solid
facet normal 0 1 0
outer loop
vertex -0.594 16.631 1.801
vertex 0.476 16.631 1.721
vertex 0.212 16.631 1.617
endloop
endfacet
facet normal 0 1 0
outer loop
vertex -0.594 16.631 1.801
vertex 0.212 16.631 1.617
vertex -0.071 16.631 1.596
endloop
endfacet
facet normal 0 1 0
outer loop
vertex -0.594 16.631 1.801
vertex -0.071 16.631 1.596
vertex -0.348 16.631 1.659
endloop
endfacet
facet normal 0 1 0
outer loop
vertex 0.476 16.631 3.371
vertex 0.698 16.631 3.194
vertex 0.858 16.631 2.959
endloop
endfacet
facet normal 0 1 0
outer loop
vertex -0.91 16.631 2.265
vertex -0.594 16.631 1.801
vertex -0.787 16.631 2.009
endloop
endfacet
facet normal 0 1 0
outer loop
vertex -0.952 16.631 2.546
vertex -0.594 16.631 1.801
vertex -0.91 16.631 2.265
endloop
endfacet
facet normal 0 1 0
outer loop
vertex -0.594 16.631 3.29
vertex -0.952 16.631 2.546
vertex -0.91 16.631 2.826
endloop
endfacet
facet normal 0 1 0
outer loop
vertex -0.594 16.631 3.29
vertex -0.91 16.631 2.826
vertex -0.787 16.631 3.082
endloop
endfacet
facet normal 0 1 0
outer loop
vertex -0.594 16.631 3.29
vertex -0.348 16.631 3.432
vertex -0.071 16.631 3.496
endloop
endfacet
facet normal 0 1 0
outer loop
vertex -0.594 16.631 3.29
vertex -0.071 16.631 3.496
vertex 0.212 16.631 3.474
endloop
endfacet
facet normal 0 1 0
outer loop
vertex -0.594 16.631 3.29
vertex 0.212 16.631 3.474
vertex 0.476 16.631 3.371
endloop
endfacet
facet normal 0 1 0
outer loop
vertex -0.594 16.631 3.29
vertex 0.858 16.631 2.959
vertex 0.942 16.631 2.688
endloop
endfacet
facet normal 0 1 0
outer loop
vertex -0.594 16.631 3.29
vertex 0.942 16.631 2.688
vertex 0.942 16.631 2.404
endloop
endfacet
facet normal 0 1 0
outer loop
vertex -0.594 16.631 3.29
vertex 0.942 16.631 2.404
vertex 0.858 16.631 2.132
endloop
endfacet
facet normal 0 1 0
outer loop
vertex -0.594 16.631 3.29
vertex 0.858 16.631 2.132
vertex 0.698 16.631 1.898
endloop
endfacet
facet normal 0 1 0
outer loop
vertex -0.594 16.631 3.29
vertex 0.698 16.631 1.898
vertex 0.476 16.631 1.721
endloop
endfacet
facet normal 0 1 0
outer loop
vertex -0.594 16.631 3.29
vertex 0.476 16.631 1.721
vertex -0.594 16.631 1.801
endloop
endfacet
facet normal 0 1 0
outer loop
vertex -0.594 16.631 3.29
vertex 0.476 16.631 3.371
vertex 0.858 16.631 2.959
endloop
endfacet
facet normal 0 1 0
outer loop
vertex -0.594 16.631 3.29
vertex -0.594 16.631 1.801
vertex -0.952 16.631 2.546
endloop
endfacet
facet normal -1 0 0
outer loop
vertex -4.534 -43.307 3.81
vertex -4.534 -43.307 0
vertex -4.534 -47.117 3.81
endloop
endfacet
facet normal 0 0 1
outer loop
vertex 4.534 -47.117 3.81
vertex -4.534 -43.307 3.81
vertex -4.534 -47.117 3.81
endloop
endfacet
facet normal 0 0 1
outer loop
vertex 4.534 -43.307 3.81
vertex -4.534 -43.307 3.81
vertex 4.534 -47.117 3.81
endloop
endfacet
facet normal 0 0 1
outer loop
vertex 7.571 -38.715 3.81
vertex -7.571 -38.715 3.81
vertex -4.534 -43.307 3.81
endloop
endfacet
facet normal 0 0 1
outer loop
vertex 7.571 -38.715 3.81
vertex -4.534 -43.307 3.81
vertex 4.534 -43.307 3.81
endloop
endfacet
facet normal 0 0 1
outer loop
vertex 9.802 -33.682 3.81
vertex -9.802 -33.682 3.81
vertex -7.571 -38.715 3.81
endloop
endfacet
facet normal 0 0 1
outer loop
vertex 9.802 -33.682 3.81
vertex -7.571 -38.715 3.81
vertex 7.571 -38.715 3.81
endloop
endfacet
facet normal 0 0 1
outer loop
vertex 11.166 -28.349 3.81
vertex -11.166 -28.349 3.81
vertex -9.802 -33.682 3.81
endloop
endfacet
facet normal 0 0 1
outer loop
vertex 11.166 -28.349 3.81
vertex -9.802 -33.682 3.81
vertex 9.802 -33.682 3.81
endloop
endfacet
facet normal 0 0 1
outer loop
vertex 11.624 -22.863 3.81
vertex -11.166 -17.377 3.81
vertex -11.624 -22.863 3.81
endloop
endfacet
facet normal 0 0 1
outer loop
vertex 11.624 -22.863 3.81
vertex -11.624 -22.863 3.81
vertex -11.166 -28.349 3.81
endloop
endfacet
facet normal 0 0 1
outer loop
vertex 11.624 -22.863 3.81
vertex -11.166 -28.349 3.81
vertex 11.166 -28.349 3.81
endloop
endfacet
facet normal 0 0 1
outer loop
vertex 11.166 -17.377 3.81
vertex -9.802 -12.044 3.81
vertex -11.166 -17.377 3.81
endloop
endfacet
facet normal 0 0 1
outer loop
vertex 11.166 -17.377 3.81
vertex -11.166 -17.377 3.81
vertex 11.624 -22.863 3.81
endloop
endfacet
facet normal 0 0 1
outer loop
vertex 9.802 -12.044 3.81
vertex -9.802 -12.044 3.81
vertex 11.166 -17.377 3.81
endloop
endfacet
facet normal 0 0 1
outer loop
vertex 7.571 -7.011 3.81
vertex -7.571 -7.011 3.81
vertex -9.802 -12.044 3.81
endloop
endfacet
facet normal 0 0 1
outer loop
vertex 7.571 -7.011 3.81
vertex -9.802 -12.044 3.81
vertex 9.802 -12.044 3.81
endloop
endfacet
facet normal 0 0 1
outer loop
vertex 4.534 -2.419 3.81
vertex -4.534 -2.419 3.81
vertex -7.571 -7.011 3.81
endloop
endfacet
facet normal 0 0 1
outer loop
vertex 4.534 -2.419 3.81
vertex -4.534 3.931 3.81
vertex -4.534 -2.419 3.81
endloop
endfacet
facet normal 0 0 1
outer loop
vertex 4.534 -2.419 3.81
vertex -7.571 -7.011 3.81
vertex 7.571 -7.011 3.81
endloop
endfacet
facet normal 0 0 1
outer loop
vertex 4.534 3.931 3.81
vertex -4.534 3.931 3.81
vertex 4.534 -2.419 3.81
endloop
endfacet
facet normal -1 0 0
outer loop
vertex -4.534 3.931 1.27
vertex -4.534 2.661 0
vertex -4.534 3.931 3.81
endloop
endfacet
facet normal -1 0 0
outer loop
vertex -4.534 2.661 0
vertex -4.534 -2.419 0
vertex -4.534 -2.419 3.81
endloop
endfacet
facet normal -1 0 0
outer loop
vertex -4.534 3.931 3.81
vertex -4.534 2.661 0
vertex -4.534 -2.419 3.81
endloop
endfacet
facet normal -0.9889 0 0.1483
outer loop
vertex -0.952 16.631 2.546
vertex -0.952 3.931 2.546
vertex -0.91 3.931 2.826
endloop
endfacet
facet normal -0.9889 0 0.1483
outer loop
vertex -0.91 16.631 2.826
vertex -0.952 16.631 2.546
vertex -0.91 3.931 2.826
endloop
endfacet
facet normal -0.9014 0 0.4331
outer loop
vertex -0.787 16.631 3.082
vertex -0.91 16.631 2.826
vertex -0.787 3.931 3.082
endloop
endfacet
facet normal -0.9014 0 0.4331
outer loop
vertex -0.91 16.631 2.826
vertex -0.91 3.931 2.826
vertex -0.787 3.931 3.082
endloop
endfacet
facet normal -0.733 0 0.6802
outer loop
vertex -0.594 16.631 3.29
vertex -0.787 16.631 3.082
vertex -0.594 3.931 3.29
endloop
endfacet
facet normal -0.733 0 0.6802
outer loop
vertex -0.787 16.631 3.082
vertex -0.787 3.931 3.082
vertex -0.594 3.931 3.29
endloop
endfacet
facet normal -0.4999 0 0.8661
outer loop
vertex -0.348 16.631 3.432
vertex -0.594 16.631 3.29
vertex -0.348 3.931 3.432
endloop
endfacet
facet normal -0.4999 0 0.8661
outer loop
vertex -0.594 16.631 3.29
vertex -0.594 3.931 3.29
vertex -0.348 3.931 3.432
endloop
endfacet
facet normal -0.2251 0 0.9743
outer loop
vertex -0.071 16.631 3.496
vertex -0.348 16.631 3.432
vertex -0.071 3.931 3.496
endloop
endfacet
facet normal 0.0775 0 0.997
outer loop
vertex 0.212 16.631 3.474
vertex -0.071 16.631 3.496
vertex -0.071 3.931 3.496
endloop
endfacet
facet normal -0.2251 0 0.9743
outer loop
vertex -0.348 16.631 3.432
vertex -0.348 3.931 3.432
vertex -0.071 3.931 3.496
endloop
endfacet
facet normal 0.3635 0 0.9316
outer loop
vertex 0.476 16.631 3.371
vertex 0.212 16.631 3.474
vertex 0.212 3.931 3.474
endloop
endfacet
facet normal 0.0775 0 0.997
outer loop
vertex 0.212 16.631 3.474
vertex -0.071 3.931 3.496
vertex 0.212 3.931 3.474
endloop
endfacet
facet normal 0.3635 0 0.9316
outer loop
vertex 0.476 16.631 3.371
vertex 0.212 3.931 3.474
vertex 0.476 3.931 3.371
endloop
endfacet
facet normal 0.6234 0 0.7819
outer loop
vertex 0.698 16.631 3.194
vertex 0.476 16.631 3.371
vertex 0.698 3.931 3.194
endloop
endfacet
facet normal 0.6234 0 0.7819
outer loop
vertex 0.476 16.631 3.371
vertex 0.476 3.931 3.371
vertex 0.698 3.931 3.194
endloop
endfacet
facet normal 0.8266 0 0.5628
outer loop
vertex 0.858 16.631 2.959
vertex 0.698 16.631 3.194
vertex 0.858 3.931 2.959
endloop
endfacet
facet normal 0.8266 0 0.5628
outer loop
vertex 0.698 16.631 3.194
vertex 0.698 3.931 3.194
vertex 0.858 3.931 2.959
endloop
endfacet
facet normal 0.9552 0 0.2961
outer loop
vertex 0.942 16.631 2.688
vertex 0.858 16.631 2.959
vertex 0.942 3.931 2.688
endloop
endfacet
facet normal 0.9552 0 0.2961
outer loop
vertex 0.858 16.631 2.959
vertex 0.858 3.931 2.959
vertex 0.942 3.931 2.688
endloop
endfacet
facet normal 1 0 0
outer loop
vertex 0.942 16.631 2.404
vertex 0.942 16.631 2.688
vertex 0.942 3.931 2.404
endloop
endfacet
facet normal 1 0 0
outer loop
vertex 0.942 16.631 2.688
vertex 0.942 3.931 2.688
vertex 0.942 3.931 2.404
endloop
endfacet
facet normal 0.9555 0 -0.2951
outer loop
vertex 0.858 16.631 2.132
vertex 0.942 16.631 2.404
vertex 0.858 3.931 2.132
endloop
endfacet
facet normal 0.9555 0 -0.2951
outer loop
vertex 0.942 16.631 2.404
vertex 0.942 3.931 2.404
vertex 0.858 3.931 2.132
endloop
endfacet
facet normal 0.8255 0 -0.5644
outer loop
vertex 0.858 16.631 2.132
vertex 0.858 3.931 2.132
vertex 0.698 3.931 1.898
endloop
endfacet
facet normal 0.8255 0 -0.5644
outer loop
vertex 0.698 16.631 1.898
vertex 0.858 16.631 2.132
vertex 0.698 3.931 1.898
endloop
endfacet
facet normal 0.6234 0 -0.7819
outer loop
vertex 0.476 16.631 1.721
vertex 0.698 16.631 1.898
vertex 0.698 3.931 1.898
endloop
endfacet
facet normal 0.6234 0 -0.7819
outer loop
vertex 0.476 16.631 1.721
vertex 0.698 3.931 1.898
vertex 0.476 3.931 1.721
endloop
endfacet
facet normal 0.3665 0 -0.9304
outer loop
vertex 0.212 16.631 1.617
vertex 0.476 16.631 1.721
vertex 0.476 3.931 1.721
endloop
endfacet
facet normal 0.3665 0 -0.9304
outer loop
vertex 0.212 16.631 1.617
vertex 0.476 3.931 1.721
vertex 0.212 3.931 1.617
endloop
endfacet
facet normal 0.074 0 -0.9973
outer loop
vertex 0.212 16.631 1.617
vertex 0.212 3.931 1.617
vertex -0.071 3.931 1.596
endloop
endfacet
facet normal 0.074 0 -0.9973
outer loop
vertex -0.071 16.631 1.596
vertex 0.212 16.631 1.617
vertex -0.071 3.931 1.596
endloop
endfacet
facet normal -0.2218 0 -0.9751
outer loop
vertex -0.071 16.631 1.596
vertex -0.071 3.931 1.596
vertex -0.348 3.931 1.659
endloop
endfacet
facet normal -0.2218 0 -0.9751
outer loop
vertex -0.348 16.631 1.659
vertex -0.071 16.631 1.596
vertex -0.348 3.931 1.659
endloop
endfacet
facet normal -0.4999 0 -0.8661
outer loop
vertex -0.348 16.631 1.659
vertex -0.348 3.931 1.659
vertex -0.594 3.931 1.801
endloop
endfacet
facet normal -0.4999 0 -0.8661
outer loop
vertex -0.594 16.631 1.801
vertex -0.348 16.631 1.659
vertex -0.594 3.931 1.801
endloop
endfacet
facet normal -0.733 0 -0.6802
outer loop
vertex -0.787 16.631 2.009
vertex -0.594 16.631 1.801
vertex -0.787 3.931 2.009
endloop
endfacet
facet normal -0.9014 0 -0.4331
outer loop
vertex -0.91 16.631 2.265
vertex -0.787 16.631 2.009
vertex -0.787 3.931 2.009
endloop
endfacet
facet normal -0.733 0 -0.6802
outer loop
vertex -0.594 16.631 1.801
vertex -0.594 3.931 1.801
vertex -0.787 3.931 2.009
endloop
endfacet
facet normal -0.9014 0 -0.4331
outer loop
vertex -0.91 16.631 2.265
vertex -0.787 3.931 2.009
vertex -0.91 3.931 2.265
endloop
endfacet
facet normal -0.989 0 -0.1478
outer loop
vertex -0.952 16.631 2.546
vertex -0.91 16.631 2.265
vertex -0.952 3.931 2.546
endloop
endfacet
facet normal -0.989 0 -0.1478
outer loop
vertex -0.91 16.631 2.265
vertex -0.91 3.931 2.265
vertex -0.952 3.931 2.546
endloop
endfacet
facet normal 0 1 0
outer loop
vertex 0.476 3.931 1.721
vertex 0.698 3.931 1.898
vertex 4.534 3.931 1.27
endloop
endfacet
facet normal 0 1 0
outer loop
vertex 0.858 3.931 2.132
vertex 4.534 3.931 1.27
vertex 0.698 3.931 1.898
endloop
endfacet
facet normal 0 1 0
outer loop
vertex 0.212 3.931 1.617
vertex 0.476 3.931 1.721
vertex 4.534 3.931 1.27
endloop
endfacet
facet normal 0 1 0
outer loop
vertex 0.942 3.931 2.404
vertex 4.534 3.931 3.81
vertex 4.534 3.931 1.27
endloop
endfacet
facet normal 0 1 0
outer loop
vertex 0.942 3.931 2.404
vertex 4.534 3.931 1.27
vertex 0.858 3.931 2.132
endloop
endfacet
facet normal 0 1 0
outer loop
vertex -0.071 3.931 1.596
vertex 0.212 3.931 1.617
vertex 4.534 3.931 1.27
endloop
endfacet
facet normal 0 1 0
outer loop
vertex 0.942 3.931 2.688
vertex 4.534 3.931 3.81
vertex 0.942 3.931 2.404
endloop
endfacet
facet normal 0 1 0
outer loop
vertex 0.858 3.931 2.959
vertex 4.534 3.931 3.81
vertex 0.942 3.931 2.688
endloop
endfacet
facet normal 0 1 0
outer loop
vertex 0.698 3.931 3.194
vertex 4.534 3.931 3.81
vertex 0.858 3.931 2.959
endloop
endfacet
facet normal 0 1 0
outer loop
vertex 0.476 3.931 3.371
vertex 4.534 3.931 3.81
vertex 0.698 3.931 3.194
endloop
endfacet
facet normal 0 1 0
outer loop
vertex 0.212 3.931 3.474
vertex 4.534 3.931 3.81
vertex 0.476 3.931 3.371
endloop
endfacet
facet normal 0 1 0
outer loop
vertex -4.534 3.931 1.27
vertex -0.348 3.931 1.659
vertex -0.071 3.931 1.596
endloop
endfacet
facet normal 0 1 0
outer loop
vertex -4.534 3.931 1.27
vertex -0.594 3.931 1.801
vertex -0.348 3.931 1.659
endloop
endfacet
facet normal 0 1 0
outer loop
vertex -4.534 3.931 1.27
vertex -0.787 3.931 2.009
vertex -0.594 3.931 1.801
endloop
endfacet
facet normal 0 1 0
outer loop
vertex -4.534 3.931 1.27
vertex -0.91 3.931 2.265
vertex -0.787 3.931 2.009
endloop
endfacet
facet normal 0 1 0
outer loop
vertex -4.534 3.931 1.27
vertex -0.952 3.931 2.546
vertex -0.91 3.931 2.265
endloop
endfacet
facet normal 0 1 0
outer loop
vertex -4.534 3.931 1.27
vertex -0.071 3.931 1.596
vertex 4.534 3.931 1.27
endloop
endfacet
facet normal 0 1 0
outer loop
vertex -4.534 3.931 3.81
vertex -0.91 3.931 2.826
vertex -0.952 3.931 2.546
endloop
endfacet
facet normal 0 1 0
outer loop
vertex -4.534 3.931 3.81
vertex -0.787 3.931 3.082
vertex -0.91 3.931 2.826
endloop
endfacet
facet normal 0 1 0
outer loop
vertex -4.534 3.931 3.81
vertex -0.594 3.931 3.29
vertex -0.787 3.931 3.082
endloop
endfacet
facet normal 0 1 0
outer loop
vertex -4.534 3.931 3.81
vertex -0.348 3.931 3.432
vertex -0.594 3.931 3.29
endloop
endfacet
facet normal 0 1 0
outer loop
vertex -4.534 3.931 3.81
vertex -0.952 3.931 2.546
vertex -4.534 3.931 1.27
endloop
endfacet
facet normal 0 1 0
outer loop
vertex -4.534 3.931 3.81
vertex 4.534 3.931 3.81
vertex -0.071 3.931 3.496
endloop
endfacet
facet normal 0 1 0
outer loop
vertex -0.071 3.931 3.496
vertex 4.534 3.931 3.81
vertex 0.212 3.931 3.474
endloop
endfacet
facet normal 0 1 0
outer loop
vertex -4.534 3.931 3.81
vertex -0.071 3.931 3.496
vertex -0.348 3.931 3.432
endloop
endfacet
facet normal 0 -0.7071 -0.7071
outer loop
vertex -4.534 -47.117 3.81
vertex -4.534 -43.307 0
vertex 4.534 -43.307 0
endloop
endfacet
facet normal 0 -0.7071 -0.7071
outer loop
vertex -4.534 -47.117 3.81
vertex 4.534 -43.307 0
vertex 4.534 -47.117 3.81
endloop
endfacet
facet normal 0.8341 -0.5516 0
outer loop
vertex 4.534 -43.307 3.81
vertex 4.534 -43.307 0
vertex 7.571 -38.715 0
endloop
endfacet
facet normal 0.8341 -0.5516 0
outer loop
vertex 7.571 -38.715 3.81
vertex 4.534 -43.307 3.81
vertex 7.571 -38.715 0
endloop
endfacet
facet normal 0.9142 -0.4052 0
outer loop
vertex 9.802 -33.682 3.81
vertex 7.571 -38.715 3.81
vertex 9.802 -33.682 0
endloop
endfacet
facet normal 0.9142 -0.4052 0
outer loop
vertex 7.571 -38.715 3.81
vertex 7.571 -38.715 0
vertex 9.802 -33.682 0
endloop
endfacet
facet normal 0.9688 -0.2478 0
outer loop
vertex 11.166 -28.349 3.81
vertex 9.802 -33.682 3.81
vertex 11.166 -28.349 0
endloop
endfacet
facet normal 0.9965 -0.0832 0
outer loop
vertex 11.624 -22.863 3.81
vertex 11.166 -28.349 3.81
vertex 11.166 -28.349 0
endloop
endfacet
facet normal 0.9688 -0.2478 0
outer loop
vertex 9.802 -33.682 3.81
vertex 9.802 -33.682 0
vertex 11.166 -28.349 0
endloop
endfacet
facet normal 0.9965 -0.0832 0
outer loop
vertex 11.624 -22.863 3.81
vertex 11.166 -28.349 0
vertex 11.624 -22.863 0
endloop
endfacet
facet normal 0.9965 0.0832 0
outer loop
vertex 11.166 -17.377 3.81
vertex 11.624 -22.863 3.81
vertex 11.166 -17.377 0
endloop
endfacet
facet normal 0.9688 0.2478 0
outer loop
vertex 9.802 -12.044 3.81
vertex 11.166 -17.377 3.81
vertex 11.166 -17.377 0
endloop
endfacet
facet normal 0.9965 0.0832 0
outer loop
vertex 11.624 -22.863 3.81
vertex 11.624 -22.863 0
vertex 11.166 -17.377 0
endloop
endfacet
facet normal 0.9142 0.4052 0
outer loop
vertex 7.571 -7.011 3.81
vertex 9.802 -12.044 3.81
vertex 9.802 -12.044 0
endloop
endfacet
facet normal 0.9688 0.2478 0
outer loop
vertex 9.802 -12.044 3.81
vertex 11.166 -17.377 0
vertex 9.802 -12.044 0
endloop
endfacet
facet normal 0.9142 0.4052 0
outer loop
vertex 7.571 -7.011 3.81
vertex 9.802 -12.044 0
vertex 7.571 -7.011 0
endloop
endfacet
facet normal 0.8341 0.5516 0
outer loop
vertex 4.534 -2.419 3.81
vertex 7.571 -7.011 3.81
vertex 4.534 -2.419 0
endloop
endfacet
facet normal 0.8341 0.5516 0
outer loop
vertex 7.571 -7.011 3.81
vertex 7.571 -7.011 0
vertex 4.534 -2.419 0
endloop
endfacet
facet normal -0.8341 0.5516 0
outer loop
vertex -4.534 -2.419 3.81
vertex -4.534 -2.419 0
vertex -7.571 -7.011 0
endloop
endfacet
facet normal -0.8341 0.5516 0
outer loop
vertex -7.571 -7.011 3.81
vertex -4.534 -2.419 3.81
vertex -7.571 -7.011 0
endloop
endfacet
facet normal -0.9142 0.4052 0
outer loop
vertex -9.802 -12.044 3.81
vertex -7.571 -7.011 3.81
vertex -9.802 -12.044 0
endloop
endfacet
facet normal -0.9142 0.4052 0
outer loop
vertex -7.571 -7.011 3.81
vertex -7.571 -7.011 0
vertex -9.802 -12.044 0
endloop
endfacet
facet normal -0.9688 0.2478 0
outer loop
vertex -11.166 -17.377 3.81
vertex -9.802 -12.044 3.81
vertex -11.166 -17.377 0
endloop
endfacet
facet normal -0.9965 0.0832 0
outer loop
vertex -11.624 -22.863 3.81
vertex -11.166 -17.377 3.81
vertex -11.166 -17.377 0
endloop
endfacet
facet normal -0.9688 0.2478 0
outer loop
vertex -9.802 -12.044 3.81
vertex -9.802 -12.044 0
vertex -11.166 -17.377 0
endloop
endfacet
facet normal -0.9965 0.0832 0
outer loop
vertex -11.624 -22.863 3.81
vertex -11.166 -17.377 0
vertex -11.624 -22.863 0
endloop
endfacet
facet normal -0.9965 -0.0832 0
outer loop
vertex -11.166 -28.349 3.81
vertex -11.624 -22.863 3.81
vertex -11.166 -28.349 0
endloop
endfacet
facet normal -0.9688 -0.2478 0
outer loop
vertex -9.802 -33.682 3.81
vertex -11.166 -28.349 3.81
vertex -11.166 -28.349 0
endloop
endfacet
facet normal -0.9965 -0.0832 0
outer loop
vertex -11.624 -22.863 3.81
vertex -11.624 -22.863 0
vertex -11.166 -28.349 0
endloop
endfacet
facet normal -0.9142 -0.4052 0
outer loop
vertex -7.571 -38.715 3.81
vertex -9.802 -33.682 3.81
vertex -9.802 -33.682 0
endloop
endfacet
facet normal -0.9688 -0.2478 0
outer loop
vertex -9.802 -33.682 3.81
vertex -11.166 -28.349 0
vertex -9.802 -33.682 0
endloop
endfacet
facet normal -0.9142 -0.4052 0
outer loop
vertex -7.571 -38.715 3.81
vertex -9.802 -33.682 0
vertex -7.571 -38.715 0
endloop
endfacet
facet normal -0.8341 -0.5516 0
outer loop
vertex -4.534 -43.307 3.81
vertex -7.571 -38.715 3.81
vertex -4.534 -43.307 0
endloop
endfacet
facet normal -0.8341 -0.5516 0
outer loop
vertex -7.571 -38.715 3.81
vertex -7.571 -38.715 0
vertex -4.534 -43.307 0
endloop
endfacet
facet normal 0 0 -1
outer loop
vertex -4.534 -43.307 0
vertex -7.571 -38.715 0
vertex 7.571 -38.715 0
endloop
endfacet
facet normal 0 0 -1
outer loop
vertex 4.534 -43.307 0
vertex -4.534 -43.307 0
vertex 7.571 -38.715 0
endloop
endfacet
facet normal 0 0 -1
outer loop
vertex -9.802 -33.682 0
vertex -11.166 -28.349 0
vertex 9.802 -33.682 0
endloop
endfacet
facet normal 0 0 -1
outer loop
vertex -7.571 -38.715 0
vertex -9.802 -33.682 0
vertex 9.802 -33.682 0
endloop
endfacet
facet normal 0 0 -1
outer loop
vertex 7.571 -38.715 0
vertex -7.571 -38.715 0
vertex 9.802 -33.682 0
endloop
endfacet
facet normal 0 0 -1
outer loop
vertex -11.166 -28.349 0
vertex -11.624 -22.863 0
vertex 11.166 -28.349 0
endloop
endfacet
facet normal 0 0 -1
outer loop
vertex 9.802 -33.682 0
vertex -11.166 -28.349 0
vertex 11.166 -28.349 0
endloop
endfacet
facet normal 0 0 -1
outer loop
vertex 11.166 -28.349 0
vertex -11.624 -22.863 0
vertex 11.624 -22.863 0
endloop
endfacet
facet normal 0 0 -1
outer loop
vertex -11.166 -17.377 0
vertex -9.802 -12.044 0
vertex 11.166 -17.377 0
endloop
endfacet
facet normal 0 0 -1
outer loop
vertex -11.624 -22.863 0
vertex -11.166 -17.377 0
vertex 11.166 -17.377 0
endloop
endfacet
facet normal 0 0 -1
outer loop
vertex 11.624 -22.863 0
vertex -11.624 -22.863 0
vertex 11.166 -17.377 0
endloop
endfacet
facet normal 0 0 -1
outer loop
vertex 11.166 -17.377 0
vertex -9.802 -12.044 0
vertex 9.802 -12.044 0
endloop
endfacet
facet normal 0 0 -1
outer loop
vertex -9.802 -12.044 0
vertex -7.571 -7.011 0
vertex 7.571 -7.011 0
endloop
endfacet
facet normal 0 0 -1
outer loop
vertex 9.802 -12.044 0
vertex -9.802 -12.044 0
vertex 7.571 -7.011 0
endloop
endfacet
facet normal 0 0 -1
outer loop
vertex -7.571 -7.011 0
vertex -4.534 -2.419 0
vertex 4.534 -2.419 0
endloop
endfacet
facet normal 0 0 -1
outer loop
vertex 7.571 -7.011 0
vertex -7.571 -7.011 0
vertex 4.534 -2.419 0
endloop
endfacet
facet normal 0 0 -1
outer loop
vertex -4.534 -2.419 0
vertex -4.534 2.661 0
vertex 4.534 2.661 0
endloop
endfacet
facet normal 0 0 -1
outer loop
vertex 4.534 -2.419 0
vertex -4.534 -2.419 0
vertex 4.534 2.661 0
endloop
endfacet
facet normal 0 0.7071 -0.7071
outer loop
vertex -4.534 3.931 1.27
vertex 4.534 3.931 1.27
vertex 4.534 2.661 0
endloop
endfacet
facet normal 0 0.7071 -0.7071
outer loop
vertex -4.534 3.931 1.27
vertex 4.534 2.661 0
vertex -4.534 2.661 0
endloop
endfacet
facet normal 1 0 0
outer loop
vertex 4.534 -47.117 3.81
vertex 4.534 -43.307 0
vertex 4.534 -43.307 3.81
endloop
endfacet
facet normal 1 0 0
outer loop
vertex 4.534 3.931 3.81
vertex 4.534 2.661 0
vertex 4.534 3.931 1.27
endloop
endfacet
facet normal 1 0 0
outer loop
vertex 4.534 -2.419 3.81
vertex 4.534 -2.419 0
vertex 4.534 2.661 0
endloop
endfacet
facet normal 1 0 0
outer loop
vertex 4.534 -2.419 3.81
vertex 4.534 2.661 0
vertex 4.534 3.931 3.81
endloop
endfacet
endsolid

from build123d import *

# Parameters (mm, degrees)
F1_DEPTH    = 3.81
F2_W        = 9.0688861602
F2_H        = 3.81
F3_DEPTH    = 6.35
F4_SIZE     = 1.27
F5_W        = 9.0688861602
F5_H        = 3.81
F6_DEPTH    = 5.08
F7_T1_DEPTH = 35.1971853179
F8_R        = 0.9525
F9_DEPTH    = 12.7


# Not quite as in the source:
# - a fillet or chamfer that OpenCascade refuses, or shapes differently, is made with other operations: its cross-section is extruded or revolved along the edge and cut away or added


with BuildPart() as f1:
    # F0 (on Top) → F1 (new body)
    with BuildSketch(Plane.XY):
        with BuildLine():
            Line((4.5344430801, -2.4189800566), (-4.5344430801, -2.4189800566))
            ThreePointArc((-4.5344430801, -2.4189800566), (-11.6244136954, -22.8629027748), (-4.5344430801, -43.306825493))
            Line((-4.5344430801, -43.306825493), (4.5344430801, -43.306825493))
            ThreePointArc((4.5344430801, -43.306825493), (11.6244136954, -22.8629027748), (4.5344430801, -2.4189800566))
        make_face()
    extrude(amount=F1_DEPTH)

    # F2 (on face) → F3 (join)
    with BuildSketch(Plane(origin=(0, -2.4189800566, 0), x_dir=(-1, 0, 0), z_dir=(0, 1, 0))):
        with Locations((0, 1.905)):
            Rectangle(F2_W, F2_H)
    extrude(amount=F3_DEPTH)

    # F4
    f4_edges = [f1.edges().sort_by_distance(p)[0] for p in [
        (0, 3.93102, 0),
    ]]
    chamfer(f4_edges, length=F4_SIZE)

    # F5 (on face) → F6 (join)
    with BuildSketch(Plane.XZ.offset(43.306825493)):
        with Locations((0, 1.905)):
            Rectangle(F5_W, F5_H)
    extrude(amount=F6_DEPTH)

    # F7: chamfer of 5.08 on 1 edges, made by hand

    # F7_s2 → F7_t1 (cut)
    with BuildSketch(Plane.YZ.offset(-17.598592659)):
        Polygon((-43.306825493, 0), (-48.386825493, 5.08), (-48.386825493, 0), align=None)
    extrude(amount=F7_T1_DEPTH, mode=Mode.SUBTRACT)

    # F8 (on face) → F9 (join)
    with BuildSketch(Plane(origin=(0, 3.9310199434, 0), x_dir=(-1, 0, 0), z_dir=(0, 1, 0))):
        with Locations((0, 2.5457337033)):
            Circle(F8_R)
    extrude(amount=F9_DEPTH)


solid = f1.part
